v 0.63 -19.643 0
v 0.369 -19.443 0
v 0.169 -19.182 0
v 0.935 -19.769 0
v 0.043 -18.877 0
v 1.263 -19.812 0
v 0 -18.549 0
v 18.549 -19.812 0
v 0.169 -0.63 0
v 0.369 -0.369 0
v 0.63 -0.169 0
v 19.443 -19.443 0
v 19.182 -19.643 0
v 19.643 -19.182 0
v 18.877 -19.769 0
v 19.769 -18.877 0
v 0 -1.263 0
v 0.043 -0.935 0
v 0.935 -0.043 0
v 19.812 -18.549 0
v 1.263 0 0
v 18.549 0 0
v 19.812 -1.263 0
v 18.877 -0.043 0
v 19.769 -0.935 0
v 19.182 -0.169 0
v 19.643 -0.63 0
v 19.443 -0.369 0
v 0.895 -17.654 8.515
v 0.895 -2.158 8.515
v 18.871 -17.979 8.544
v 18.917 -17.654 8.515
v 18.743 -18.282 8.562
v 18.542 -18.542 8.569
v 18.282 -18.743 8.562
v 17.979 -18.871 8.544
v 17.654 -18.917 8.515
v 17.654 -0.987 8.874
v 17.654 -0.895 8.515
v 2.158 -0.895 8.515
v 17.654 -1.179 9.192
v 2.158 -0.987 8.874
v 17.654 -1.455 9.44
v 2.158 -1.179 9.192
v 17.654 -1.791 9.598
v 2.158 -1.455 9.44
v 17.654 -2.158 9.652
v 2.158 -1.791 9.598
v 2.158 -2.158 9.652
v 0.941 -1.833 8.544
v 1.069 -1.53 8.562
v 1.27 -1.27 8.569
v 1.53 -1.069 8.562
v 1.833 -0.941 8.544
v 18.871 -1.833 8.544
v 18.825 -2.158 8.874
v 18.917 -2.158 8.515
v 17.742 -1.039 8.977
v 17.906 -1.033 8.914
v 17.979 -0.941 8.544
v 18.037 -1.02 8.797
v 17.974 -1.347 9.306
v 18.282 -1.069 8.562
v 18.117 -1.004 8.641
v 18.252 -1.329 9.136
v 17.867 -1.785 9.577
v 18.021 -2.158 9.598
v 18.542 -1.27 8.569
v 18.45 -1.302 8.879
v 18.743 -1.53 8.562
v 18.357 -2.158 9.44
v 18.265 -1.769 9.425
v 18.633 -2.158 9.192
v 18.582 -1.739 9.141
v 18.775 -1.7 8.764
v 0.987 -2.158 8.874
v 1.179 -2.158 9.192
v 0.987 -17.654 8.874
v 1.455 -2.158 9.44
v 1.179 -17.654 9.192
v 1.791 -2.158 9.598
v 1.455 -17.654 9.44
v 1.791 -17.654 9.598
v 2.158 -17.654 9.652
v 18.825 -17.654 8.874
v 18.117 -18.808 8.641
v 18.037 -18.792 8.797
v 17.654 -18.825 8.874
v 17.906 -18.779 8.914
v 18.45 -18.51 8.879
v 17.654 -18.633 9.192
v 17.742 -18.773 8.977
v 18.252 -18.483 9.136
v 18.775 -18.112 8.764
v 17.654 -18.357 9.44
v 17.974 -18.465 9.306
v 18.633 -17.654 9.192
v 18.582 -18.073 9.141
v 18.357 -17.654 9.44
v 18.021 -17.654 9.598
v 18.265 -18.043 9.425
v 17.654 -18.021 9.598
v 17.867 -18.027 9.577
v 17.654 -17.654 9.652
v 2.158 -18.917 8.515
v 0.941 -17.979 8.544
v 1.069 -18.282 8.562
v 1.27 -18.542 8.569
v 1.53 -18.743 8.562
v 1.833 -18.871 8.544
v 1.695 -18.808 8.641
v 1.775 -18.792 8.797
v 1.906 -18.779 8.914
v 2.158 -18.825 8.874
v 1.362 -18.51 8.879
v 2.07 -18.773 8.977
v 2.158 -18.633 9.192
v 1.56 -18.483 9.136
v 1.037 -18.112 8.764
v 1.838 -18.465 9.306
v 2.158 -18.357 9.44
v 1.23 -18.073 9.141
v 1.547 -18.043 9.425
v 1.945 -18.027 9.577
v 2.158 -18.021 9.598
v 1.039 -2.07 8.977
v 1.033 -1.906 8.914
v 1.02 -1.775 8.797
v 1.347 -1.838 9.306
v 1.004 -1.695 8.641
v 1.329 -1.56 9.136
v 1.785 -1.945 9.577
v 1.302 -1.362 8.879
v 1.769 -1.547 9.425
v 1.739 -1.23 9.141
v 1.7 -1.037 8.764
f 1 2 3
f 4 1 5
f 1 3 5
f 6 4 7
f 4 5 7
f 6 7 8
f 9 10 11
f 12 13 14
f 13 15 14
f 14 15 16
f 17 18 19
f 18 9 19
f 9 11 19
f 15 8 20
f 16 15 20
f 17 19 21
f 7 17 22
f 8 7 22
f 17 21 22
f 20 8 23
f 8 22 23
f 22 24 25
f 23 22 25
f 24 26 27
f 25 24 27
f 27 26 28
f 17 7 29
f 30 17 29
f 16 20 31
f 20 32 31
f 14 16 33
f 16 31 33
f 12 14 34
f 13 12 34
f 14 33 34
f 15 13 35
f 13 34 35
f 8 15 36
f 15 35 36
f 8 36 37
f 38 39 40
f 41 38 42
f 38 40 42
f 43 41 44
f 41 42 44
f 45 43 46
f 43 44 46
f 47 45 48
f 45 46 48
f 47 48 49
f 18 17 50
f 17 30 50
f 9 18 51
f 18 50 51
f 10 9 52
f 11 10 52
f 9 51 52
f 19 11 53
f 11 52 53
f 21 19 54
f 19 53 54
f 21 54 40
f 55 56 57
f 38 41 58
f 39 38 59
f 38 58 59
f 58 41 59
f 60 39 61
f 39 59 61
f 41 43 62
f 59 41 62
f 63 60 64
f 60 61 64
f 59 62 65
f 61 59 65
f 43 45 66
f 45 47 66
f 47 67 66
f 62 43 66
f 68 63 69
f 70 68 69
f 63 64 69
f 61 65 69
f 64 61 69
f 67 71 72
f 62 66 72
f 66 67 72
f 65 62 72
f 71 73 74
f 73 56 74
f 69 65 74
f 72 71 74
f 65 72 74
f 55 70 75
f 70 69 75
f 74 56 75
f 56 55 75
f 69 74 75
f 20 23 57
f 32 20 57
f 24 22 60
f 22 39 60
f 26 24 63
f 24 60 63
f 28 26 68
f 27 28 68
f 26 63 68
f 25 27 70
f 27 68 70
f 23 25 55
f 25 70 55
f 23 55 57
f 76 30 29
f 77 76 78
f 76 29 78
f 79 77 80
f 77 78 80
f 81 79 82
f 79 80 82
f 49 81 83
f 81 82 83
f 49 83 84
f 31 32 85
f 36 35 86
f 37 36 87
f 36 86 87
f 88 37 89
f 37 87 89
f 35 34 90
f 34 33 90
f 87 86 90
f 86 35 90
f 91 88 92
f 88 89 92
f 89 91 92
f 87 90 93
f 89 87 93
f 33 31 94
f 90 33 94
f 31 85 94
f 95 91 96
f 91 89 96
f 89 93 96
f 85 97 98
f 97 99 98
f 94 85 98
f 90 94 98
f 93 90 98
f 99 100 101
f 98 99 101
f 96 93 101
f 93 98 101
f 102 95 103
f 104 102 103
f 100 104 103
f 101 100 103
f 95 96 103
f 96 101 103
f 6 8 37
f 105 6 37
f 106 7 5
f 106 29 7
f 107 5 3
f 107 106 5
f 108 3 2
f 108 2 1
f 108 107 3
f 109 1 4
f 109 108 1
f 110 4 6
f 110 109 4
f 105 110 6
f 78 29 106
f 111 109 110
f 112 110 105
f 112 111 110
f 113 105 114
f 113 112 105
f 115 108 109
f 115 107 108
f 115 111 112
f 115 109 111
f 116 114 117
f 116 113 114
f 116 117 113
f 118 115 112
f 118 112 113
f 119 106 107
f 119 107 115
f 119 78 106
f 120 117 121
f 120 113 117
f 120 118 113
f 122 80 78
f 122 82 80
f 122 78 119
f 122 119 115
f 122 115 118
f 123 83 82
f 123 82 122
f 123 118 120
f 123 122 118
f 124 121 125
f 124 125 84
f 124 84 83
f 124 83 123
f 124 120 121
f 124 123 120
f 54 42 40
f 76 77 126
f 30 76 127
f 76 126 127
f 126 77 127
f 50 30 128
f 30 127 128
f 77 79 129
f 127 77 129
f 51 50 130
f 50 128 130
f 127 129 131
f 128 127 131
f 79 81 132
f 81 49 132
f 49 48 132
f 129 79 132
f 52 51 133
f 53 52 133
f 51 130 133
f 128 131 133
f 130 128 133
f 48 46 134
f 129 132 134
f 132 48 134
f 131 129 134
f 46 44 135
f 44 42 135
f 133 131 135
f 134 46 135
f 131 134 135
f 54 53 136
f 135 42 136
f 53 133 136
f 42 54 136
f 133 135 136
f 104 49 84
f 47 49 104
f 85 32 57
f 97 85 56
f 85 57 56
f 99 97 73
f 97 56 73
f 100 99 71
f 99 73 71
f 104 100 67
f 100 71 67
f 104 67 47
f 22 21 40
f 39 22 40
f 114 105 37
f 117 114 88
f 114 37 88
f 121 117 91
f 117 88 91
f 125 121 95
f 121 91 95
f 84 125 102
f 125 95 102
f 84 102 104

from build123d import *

# Parameters (mm, degrees)
SKETCH1_W           = 19.812
SKETCH1_H           = 19.812
BOSS_EXTRUDE1_DEPTH = 9.652
BOSS_EXTRUDE1_TAPER = 6
FILLET1_R           = 1.27


with BuildPart() as part:
    # Sketch1 → Boss-Extrude1 (new body)
    with BuildSketch(Plane.XY):
        with Locations((9.906, -9.906)):
            Rectangle(SKETCH1_W, SKETCH1_H)
    extrude(amount=BOSS_EXTRUDE1_DEPTH, taper=BOSS_EXTRUDE1_TAPER)

    # Fillet1
    fillet1_edges = [part.edges().sort_by_distance(p)[0] for p in [
        (18.797533921, -9.906, 9.652),
        (9.906, -1.014466079, 9.652),
        (1.014466079, -9.906, 9.652),
        (0.507233039, -0.507233039, 4.826),
        (19.304766961, -0.507233039, 4.826),
        (19.304766961, -19.304766961, 4.826),
        (0.507233501, -19.304766499, 4.826004395),
        (9.906, -18.797533921, 9.652),
    ]]
    fillet(fillet1_edges, radius=FILLET1_R)


solid = part.part
